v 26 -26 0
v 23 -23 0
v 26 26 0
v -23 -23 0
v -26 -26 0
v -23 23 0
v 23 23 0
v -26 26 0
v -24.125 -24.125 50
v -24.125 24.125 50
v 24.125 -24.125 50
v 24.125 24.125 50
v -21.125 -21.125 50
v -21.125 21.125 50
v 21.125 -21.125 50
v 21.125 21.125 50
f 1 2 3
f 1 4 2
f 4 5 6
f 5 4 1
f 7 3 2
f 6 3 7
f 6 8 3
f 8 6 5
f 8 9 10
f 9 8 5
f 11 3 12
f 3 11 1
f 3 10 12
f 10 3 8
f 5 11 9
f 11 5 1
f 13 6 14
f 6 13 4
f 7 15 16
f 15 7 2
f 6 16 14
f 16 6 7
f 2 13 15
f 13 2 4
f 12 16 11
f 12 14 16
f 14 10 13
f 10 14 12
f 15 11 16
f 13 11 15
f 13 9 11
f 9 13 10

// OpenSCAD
// file: tower.scad
// ======================================================
// Dice Tower (tapered shell) + DIAGONAL baffles (wall-to-wall)
// Baffles tilt across X (rotate about Y) and alternate each level
// ======================================================
$fn = 64;

// ---------- Tower geometry ----------
tower_h       = 160;   // body height (not counting cap)
outer_w_bot   = 52;    // outer width at base
outer_w_top   = 40;    // outer width at top
wall          = 3;     // wall thickness
cap_h         = 18;    // little pyramid cap

// Inner chute (constant rectangle, centered)
chute_w       = 32;    // X (give chunky d20s room)
chute_d       = 32;    // Y

// Exit opening (front = +Y)
base_clear_h  = 22;
exit_w        = 34;
exit_h        = 20;

// Funnel at top
funnel_h      = 20;
funnel_over   = 3;

// ---------- Baffles (DIAGONAL across X) ----------
num_baffles       = 6;
baffle_t          = 3.0;   // slightly thicker for robustness
baffle_angle_deg  = 15;     // slope across X (left high → right low, then flip)
baffle_margin     = 10;     // top/bottom margin before first/after last
y_clear_from_wall = 1.5;    // clearance from front/back walls (Y)
 x_overlap         = 1.0;    // small penetration into wall to avoid boolean slivers
baffle_max_width  = 18;     // max baffle width to prevent jamming

// ---------- helpers ----------
module taper(wb, wt, h){ linear_extrude(h, scale=wt/wb) square([wb,wb], center=true); }
function iw_bot() = outer_w_bot - 2*wall;
function iw_top() = outer_w_top - 2*wall;
function inner_w_at_z(z) = iw_bot() + (iw_top() - iw_bot()) * (z / tower_h);

// ---------- outer shell ----------
module outer_shell(){
  union(){
    taper(outer_w_bot, outer_w_top, tower_h);
    // Replace polyhedron cap with a short flat-ish cap to avoid fragile apex
    translate([0,0,tower_h])
      taper(outer_w_top, 4.0, cap_h*0.6); // small flat cap rather than a sharp point
  }
}

// ---------- subtractions ----------
module inner_cavity_taper(){ taper(iw_bot(), iw_top(), tower_h); }
module main_chute(){ linear_extrude(tower_h) square([chute_w, chute_d], center=true); }
module exit_window(){
  translate([0,0,base_clear_h + exit_h/2])
    rotate([90,0,0]) cube([exit_w, wall*2+0.2, exit_h], center=true);
}
module top_funnel(){
  fw_top = chute_w + 2*funnel_over;
  fw_bot = iw_top() - 2;
  fh     = min(funnel_h, tower_h*0.35);
  translate([0,0,tower_h - fh]) taper(fw_bot, fw_top, fh);
}

// ---------- DIAGONAL baffles (tilt across X, alternate) ----------
module baffles_diagonal(){
  usable_h = (tower_h - base_clear_h) - 2*baffle_margin;
  spacing  = usable_h / max(num_baffles,1);

  // size in Y (front/back) – centered with a small gap to both walls
  len_y = chute_d - 2*y_clear_from_wall;

  for(i=[0:num_baffles-1]){
    zc   = base_clear_h + baffle_margin + spacing*(i+0.5);
    iw_z = inner_w_at_z(zc);             // inner width between side walls at this Z

    // PROPER FIX: Baffles must attach to walls to be printable
    // Alternate between left-wall and right-wall attachment
    // Each baffle spans from one wall partway across, leaving flow gap on opposite side
    
    // Safety clamp: ensure flow gap is large enough for common D20s.
    // gap = chute_w - len_x  => enforce gap >= safe_d20 + clearance
    safe_d20   = 22.5;    // typical tip-to-tip diagonal for D20 (mm)
    clearance  = 0.5;     // extra wiggle room (mm)
  // maximum allowed baffle length so the remaining gap fits a D20
  max_len_allowed = max([0, chute_w - (safe_d20 + clearance)]);

  // clamp also by the local inner width at this Z to avoid overhanging into the tapered shell
  // leave a small margin so baffles don't butt exactly at the wall edge
  small_margin = 2.0;
  cap_by_inner = max([0, iw_z - small_margin]);

  // final baffle length: pick the desired coverage, clamp by D20, max width, and inner width;
  // ensure a tiny positive minimum so cube() never gets a zero size
  len_x = max([0.1, min([chute_w * 0.4, max_len_allowed, baffle_max_width, cap_by_inner])]);

    // Add a tiny positive overlap into the wall to avoid boolean slivers (use x_overlap if set)
    wall_penetration = max([0, x_overlap]);

    // compute x_offset so the baffle visibly attaches to the INNER wall at this Z
    inner_half = iw_z / 2;
    left_face  = -inner_half - wall_penetration; // a bit into the inner wall
    right_face =  inner_half + wall_penetration;
    x_offset = (i % 2 == 0) ?
      left_face + len_x/2 :   // Even: attach to LEFT inner wall
      right_face - len_x/2;   // Odd: attach to RIGHT inner wall

    // alternate slope across X: even -> left high/right low, odd -> reverse
    sign = (i % 2 == 0) ? 1 : -1;
    tilt = sign * baffle_angle_deg;

    // Single diagonal baffle - attached to alternating walls
    translate([x_offset, 0, zc])
      rotate([0, tilt, 0])
        cube([len_x, len_y, baffle_t], center=true);
  }
}

// ---------- assembly ----------
difference(){
  union(){
    outer_shell();
    // include internal shelves so they remain after subtraction
    baffles_diagonal();
  }
  inner_cavity_taper();
  main_chute();    // ensures a straight chute inside the tapered shell
  exit_window();
  top_funnel();
}

/* Tuning:
- Want a stronger slope?   baffle_angle_deg = 18–20
- Easier bridging?         baffle_t = 3.0
- More room for big dice?  chute_w = chute_d = 34
- Shelves touching side walls more obviously? increase x_overlap to 1.0
- If you prefer the “front/back hug” style instead, tell me and I’ll swap the
  tilt axis (rotate about X) and add the exact Y wall gap computation.
*/

// ---------- test slice helper ----------
// Renders a short vertical slice of the tower (0..slice_h mm) for test-printing
module test_slice(slice_h = 50){
  // render the final assembled tower, then clip with an intersection cube
  intersection(){
    // full model
    difference(){
      union(){ outer_shell(); baffles_diagonal(); }
      inner_cavity_taper();
      main_chute();
      exit_window();
      top_funnel();
    }
    // clipping box
    translate([-100,-100,0])
      cube([200,200,slice_h], center=false);
  }
}
// main file
use <tower.scad>

// Create a 50mm tall test slice for printing
test_slice(50);
